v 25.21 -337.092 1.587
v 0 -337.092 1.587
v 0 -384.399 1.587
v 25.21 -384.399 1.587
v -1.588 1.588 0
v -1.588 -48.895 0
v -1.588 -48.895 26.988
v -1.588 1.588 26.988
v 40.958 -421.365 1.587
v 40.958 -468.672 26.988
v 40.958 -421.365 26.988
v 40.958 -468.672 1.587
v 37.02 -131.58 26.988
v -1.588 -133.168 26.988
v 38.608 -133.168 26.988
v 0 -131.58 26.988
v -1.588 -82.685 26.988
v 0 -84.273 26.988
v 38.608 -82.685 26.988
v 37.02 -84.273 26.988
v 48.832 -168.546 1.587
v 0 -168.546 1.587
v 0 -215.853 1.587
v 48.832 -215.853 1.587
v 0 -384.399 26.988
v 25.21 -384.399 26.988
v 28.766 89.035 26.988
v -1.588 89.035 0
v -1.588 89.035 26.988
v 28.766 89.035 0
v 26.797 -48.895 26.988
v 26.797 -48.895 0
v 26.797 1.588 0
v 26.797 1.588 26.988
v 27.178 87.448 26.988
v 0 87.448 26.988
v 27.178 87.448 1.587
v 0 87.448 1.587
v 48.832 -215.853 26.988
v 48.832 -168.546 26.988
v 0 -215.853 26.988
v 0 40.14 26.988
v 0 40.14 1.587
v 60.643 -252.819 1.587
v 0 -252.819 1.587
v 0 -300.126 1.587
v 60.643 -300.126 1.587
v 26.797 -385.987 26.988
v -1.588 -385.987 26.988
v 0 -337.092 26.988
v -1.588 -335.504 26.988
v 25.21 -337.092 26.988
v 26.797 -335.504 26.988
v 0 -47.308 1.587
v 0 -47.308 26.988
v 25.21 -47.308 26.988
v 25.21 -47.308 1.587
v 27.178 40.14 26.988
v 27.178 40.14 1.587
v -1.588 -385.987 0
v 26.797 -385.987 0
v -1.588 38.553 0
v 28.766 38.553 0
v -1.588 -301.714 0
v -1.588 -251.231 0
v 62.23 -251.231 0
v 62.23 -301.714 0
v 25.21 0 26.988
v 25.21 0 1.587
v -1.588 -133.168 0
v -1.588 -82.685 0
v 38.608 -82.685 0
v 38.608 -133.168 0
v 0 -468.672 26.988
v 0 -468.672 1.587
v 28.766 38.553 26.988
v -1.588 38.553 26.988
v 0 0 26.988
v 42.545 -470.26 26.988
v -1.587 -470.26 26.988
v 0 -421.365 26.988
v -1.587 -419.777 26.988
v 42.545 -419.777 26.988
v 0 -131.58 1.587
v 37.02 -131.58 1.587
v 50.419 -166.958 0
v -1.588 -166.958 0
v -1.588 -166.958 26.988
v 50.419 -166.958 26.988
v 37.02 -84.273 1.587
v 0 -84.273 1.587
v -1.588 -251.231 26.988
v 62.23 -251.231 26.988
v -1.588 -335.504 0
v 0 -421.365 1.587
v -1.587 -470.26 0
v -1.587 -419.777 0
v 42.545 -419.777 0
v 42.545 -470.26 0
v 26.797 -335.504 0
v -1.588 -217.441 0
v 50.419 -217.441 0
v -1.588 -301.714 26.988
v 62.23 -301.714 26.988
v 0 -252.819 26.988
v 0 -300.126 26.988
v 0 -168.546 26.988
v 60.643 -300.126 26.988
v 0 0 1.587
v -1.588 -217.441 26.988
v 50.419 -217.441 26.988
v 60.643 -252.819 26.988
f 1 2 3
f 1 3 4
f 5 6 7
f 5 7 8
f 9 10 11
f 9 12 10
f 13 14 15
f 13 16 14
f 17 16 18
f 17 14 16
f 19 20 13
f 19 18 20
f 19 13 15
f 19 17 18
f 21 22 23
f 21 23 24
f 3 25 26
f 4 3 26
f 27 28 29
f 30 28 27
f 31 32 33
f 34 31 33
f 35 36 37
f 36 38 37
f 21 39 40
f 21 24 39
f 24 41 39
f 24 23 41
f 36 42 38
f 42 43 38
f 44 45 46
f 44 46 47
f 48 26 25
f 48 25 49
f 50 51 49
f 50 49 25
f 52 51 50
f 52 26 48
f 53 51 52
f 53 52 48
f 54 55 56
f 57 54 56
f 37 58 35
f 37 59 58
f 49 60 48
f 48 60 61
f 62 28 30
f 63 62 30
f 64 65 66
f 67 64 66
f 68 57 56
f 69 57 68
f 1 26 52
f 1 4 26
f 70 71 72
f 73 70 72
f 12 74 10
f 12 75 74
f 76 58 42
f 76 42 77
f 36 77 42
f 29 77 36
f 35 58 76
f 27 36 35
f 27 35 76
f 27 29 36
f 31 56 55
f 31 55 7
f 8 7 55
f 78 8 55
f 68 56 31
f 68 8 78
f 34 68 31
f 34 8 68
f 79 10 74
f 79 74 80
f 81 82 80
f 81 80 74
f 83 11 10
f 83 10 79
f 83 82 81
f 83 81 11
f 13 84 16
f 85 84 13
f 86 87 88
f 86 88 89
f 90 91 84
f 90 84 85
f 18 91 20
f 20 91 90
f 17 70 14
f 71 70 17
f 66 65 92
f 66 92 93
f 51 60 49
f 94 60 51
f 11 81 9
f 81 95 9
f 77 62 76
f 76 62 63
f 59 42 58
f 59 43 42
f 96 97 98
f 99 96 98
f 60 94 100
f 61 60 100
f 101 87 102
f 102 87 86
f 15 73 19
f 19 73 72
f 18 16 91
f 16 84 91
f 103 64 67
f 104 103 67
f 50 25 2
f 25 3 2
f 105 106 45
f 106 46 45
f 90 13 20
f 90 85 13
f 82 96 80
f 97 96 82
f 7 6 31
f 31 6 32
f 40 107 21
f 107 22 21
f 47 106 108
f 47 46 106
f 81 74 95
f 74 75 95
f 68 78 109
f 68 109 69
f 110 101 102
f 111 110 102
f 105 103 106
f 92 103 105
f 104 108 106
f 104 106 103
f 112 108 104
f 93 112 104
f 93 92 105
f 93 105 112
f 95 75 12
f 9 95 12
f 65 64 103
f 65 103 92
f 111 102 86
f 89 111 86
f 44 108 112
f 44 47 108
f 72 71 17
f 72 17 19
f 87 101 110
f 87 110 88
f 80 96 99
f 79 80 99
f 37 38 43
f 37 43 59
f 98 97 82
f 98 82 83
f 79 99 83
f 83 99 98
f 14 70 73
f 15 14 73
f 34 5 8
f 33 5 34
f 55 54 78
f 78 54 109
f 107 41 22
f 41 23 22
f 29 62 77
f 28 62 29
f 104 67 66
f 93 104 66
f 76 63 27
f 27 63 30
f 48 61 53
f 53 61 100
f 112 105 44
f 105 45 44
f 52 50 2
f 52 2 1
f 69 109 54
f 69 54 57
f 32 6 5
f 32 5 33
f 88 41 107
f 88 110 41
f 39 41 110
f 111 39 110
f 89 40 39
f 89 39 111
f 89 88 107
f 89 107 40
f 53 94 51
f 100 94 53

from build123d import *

# Parameters (mm, degrees)
F3_W     = 30.353
F3_H     = 50.4825
F4_DEPTH = 26.9875
F3_W_2   = 28.3845
F3_W_3   = 40.1955
F3_W_4   = 52.0065
F3_W_5   = 63.8175
F3_W_6   = 44.1325
F5_T     = -1.5875
F5_2_T   = -1.5875
F5_3_T   = -1.5875
F5_4_T   = -1.5875
F5_5_T   = -1.5875
F5_6_T   = -1.5875
F5_7_T   = -1.5875


# Not quite as in the source:
# - a variable given as a bare number and used for a length is read in inches; the dataset says mm whatever the document's units were
# - a feature names something its author has since deleted; it is built from what else it names


with BuildPart() as f4:
    # F3 (on Top) → F4 (new body)
    with BuildSketch(Plane.XY):
        with Locations((13.589, 63.7941811943)):
            Rectangle(F3_W, F3_H)
    extrude(amount=F4_DEPTH)

    # F5#7
    f5_7_openings = [f4.faces().sort_by_distance(p)[0] for p in [
        (13.589, 63.794181, 26.9875),
    ]]
    offset(amount=F5_7_T, openings=f5_7_openings)


with BuildPart() as f4b:
    # F3 (on Top) → F4, piece 2 (new body)
    with BuildSketch(Plane.XY):
        with Locations((12.60475, -23.65375)):
            Rectangle(F3_W_2, F3_H)
    extrude(amount=F4_DEPTH)

    # F5#6
    f5_6_openings = [f4b.faces().sort_by_distance(p)[0] for p in [
        (12.60475, -23.65375, 26.9875),
    ]]
    offset(amount=F5_6_T, openings=f5_6_openings)


with BuildPart() as f4c:
    # F3 (on Top) → F4, piece 3 (new body)
    with BuildSketch(Plane.XY):
        with Locations((18.51025, -107.9266811943)):
            Rectangle(F3_W_3, F3_H)
    extrude(amount=F4_DEPTH)

    # F5#5
    f5_5_openings = [f4c.faces().sort_by_distance(p)[0] for p in [
        (18.51025, -107.926681, 26.9875),
    ]]
    offset(amount=F5_5_T, openings=f5_5_openings)


with BuildPart() as f4d:
    # F3 (on Top) → F4, piece 4 (new body)
    with BuildSketch(Plane.XY):
        with Locations((24.41575, -192.1996123886)):
            Rectangle(F3_W_4, F3_H)
    extrude(amount=F4_DEPTH)

    # F5#4
    f5_4_openings = [f4d.faces().sort_by_distance(p)[0] for p in [
        (24.41575, -192.199612, 26.9875),
    ]]
    offset(amount=F5_4_T, openings=f5_4_openings)


with BuildPart() as f4e:
    # F3 (on Top) → F4, piece 5 (new body)
    with BuildSketch(Plane.XY):
        with Locations((30.32125, -276.4725435829)):
            Rectangle(F3_W_5, F3_H)
    extrude(amount=F4_DEPTH)

    # F5#3
    f5_3_openings = [f4e.faces().sort_by_distance(p)[0] for p in [
        (30.32125, -276.472544, 26.9875),
    ]]
    offset(amount=F5_3_T, openings=f5_3_openings)


with BuildPart() as f4f:
    # F3 (on Top) → F4, piece 6 (new body)
    with BuildSketch(Plane.XY):
        with Locations((12.60475, -360.7454747772)):
            Rectangle(F3_W_2, F3_H)
    extrude(amount=F4_DEPTH)

    # F5#2
    f5_2_openings = [f4f.faces().sort_by_distance(p)[0] for p in [
        (12.60475, -360.745475, 26.9875),
    ]]
    offset(amount=F5_2_T, openings=f5_2_openings)


with BuildPart() as f4g:
    # F3 (on Top) → F4, piece 7 (new body)
    with BuildSketch(Plane.XY):
        with Locations((20.47875, -445.0184059715)):
            Rectangle(F3_W_6, F3_H)
    extrude(amount=F4_DEPTH)

    # F5
    f5_openings = [f4g.faces().sort_by_distance(p)[0] for p in [
        (20.47875, -445.018406, 26.9875),
    ]]
    offset(amount=F5_T, openings=f5_openings)


solid = Compound([f4.part, f4b.part, f4c.part, f4d.part, f4e.part, f4f.part, f4g.part])
